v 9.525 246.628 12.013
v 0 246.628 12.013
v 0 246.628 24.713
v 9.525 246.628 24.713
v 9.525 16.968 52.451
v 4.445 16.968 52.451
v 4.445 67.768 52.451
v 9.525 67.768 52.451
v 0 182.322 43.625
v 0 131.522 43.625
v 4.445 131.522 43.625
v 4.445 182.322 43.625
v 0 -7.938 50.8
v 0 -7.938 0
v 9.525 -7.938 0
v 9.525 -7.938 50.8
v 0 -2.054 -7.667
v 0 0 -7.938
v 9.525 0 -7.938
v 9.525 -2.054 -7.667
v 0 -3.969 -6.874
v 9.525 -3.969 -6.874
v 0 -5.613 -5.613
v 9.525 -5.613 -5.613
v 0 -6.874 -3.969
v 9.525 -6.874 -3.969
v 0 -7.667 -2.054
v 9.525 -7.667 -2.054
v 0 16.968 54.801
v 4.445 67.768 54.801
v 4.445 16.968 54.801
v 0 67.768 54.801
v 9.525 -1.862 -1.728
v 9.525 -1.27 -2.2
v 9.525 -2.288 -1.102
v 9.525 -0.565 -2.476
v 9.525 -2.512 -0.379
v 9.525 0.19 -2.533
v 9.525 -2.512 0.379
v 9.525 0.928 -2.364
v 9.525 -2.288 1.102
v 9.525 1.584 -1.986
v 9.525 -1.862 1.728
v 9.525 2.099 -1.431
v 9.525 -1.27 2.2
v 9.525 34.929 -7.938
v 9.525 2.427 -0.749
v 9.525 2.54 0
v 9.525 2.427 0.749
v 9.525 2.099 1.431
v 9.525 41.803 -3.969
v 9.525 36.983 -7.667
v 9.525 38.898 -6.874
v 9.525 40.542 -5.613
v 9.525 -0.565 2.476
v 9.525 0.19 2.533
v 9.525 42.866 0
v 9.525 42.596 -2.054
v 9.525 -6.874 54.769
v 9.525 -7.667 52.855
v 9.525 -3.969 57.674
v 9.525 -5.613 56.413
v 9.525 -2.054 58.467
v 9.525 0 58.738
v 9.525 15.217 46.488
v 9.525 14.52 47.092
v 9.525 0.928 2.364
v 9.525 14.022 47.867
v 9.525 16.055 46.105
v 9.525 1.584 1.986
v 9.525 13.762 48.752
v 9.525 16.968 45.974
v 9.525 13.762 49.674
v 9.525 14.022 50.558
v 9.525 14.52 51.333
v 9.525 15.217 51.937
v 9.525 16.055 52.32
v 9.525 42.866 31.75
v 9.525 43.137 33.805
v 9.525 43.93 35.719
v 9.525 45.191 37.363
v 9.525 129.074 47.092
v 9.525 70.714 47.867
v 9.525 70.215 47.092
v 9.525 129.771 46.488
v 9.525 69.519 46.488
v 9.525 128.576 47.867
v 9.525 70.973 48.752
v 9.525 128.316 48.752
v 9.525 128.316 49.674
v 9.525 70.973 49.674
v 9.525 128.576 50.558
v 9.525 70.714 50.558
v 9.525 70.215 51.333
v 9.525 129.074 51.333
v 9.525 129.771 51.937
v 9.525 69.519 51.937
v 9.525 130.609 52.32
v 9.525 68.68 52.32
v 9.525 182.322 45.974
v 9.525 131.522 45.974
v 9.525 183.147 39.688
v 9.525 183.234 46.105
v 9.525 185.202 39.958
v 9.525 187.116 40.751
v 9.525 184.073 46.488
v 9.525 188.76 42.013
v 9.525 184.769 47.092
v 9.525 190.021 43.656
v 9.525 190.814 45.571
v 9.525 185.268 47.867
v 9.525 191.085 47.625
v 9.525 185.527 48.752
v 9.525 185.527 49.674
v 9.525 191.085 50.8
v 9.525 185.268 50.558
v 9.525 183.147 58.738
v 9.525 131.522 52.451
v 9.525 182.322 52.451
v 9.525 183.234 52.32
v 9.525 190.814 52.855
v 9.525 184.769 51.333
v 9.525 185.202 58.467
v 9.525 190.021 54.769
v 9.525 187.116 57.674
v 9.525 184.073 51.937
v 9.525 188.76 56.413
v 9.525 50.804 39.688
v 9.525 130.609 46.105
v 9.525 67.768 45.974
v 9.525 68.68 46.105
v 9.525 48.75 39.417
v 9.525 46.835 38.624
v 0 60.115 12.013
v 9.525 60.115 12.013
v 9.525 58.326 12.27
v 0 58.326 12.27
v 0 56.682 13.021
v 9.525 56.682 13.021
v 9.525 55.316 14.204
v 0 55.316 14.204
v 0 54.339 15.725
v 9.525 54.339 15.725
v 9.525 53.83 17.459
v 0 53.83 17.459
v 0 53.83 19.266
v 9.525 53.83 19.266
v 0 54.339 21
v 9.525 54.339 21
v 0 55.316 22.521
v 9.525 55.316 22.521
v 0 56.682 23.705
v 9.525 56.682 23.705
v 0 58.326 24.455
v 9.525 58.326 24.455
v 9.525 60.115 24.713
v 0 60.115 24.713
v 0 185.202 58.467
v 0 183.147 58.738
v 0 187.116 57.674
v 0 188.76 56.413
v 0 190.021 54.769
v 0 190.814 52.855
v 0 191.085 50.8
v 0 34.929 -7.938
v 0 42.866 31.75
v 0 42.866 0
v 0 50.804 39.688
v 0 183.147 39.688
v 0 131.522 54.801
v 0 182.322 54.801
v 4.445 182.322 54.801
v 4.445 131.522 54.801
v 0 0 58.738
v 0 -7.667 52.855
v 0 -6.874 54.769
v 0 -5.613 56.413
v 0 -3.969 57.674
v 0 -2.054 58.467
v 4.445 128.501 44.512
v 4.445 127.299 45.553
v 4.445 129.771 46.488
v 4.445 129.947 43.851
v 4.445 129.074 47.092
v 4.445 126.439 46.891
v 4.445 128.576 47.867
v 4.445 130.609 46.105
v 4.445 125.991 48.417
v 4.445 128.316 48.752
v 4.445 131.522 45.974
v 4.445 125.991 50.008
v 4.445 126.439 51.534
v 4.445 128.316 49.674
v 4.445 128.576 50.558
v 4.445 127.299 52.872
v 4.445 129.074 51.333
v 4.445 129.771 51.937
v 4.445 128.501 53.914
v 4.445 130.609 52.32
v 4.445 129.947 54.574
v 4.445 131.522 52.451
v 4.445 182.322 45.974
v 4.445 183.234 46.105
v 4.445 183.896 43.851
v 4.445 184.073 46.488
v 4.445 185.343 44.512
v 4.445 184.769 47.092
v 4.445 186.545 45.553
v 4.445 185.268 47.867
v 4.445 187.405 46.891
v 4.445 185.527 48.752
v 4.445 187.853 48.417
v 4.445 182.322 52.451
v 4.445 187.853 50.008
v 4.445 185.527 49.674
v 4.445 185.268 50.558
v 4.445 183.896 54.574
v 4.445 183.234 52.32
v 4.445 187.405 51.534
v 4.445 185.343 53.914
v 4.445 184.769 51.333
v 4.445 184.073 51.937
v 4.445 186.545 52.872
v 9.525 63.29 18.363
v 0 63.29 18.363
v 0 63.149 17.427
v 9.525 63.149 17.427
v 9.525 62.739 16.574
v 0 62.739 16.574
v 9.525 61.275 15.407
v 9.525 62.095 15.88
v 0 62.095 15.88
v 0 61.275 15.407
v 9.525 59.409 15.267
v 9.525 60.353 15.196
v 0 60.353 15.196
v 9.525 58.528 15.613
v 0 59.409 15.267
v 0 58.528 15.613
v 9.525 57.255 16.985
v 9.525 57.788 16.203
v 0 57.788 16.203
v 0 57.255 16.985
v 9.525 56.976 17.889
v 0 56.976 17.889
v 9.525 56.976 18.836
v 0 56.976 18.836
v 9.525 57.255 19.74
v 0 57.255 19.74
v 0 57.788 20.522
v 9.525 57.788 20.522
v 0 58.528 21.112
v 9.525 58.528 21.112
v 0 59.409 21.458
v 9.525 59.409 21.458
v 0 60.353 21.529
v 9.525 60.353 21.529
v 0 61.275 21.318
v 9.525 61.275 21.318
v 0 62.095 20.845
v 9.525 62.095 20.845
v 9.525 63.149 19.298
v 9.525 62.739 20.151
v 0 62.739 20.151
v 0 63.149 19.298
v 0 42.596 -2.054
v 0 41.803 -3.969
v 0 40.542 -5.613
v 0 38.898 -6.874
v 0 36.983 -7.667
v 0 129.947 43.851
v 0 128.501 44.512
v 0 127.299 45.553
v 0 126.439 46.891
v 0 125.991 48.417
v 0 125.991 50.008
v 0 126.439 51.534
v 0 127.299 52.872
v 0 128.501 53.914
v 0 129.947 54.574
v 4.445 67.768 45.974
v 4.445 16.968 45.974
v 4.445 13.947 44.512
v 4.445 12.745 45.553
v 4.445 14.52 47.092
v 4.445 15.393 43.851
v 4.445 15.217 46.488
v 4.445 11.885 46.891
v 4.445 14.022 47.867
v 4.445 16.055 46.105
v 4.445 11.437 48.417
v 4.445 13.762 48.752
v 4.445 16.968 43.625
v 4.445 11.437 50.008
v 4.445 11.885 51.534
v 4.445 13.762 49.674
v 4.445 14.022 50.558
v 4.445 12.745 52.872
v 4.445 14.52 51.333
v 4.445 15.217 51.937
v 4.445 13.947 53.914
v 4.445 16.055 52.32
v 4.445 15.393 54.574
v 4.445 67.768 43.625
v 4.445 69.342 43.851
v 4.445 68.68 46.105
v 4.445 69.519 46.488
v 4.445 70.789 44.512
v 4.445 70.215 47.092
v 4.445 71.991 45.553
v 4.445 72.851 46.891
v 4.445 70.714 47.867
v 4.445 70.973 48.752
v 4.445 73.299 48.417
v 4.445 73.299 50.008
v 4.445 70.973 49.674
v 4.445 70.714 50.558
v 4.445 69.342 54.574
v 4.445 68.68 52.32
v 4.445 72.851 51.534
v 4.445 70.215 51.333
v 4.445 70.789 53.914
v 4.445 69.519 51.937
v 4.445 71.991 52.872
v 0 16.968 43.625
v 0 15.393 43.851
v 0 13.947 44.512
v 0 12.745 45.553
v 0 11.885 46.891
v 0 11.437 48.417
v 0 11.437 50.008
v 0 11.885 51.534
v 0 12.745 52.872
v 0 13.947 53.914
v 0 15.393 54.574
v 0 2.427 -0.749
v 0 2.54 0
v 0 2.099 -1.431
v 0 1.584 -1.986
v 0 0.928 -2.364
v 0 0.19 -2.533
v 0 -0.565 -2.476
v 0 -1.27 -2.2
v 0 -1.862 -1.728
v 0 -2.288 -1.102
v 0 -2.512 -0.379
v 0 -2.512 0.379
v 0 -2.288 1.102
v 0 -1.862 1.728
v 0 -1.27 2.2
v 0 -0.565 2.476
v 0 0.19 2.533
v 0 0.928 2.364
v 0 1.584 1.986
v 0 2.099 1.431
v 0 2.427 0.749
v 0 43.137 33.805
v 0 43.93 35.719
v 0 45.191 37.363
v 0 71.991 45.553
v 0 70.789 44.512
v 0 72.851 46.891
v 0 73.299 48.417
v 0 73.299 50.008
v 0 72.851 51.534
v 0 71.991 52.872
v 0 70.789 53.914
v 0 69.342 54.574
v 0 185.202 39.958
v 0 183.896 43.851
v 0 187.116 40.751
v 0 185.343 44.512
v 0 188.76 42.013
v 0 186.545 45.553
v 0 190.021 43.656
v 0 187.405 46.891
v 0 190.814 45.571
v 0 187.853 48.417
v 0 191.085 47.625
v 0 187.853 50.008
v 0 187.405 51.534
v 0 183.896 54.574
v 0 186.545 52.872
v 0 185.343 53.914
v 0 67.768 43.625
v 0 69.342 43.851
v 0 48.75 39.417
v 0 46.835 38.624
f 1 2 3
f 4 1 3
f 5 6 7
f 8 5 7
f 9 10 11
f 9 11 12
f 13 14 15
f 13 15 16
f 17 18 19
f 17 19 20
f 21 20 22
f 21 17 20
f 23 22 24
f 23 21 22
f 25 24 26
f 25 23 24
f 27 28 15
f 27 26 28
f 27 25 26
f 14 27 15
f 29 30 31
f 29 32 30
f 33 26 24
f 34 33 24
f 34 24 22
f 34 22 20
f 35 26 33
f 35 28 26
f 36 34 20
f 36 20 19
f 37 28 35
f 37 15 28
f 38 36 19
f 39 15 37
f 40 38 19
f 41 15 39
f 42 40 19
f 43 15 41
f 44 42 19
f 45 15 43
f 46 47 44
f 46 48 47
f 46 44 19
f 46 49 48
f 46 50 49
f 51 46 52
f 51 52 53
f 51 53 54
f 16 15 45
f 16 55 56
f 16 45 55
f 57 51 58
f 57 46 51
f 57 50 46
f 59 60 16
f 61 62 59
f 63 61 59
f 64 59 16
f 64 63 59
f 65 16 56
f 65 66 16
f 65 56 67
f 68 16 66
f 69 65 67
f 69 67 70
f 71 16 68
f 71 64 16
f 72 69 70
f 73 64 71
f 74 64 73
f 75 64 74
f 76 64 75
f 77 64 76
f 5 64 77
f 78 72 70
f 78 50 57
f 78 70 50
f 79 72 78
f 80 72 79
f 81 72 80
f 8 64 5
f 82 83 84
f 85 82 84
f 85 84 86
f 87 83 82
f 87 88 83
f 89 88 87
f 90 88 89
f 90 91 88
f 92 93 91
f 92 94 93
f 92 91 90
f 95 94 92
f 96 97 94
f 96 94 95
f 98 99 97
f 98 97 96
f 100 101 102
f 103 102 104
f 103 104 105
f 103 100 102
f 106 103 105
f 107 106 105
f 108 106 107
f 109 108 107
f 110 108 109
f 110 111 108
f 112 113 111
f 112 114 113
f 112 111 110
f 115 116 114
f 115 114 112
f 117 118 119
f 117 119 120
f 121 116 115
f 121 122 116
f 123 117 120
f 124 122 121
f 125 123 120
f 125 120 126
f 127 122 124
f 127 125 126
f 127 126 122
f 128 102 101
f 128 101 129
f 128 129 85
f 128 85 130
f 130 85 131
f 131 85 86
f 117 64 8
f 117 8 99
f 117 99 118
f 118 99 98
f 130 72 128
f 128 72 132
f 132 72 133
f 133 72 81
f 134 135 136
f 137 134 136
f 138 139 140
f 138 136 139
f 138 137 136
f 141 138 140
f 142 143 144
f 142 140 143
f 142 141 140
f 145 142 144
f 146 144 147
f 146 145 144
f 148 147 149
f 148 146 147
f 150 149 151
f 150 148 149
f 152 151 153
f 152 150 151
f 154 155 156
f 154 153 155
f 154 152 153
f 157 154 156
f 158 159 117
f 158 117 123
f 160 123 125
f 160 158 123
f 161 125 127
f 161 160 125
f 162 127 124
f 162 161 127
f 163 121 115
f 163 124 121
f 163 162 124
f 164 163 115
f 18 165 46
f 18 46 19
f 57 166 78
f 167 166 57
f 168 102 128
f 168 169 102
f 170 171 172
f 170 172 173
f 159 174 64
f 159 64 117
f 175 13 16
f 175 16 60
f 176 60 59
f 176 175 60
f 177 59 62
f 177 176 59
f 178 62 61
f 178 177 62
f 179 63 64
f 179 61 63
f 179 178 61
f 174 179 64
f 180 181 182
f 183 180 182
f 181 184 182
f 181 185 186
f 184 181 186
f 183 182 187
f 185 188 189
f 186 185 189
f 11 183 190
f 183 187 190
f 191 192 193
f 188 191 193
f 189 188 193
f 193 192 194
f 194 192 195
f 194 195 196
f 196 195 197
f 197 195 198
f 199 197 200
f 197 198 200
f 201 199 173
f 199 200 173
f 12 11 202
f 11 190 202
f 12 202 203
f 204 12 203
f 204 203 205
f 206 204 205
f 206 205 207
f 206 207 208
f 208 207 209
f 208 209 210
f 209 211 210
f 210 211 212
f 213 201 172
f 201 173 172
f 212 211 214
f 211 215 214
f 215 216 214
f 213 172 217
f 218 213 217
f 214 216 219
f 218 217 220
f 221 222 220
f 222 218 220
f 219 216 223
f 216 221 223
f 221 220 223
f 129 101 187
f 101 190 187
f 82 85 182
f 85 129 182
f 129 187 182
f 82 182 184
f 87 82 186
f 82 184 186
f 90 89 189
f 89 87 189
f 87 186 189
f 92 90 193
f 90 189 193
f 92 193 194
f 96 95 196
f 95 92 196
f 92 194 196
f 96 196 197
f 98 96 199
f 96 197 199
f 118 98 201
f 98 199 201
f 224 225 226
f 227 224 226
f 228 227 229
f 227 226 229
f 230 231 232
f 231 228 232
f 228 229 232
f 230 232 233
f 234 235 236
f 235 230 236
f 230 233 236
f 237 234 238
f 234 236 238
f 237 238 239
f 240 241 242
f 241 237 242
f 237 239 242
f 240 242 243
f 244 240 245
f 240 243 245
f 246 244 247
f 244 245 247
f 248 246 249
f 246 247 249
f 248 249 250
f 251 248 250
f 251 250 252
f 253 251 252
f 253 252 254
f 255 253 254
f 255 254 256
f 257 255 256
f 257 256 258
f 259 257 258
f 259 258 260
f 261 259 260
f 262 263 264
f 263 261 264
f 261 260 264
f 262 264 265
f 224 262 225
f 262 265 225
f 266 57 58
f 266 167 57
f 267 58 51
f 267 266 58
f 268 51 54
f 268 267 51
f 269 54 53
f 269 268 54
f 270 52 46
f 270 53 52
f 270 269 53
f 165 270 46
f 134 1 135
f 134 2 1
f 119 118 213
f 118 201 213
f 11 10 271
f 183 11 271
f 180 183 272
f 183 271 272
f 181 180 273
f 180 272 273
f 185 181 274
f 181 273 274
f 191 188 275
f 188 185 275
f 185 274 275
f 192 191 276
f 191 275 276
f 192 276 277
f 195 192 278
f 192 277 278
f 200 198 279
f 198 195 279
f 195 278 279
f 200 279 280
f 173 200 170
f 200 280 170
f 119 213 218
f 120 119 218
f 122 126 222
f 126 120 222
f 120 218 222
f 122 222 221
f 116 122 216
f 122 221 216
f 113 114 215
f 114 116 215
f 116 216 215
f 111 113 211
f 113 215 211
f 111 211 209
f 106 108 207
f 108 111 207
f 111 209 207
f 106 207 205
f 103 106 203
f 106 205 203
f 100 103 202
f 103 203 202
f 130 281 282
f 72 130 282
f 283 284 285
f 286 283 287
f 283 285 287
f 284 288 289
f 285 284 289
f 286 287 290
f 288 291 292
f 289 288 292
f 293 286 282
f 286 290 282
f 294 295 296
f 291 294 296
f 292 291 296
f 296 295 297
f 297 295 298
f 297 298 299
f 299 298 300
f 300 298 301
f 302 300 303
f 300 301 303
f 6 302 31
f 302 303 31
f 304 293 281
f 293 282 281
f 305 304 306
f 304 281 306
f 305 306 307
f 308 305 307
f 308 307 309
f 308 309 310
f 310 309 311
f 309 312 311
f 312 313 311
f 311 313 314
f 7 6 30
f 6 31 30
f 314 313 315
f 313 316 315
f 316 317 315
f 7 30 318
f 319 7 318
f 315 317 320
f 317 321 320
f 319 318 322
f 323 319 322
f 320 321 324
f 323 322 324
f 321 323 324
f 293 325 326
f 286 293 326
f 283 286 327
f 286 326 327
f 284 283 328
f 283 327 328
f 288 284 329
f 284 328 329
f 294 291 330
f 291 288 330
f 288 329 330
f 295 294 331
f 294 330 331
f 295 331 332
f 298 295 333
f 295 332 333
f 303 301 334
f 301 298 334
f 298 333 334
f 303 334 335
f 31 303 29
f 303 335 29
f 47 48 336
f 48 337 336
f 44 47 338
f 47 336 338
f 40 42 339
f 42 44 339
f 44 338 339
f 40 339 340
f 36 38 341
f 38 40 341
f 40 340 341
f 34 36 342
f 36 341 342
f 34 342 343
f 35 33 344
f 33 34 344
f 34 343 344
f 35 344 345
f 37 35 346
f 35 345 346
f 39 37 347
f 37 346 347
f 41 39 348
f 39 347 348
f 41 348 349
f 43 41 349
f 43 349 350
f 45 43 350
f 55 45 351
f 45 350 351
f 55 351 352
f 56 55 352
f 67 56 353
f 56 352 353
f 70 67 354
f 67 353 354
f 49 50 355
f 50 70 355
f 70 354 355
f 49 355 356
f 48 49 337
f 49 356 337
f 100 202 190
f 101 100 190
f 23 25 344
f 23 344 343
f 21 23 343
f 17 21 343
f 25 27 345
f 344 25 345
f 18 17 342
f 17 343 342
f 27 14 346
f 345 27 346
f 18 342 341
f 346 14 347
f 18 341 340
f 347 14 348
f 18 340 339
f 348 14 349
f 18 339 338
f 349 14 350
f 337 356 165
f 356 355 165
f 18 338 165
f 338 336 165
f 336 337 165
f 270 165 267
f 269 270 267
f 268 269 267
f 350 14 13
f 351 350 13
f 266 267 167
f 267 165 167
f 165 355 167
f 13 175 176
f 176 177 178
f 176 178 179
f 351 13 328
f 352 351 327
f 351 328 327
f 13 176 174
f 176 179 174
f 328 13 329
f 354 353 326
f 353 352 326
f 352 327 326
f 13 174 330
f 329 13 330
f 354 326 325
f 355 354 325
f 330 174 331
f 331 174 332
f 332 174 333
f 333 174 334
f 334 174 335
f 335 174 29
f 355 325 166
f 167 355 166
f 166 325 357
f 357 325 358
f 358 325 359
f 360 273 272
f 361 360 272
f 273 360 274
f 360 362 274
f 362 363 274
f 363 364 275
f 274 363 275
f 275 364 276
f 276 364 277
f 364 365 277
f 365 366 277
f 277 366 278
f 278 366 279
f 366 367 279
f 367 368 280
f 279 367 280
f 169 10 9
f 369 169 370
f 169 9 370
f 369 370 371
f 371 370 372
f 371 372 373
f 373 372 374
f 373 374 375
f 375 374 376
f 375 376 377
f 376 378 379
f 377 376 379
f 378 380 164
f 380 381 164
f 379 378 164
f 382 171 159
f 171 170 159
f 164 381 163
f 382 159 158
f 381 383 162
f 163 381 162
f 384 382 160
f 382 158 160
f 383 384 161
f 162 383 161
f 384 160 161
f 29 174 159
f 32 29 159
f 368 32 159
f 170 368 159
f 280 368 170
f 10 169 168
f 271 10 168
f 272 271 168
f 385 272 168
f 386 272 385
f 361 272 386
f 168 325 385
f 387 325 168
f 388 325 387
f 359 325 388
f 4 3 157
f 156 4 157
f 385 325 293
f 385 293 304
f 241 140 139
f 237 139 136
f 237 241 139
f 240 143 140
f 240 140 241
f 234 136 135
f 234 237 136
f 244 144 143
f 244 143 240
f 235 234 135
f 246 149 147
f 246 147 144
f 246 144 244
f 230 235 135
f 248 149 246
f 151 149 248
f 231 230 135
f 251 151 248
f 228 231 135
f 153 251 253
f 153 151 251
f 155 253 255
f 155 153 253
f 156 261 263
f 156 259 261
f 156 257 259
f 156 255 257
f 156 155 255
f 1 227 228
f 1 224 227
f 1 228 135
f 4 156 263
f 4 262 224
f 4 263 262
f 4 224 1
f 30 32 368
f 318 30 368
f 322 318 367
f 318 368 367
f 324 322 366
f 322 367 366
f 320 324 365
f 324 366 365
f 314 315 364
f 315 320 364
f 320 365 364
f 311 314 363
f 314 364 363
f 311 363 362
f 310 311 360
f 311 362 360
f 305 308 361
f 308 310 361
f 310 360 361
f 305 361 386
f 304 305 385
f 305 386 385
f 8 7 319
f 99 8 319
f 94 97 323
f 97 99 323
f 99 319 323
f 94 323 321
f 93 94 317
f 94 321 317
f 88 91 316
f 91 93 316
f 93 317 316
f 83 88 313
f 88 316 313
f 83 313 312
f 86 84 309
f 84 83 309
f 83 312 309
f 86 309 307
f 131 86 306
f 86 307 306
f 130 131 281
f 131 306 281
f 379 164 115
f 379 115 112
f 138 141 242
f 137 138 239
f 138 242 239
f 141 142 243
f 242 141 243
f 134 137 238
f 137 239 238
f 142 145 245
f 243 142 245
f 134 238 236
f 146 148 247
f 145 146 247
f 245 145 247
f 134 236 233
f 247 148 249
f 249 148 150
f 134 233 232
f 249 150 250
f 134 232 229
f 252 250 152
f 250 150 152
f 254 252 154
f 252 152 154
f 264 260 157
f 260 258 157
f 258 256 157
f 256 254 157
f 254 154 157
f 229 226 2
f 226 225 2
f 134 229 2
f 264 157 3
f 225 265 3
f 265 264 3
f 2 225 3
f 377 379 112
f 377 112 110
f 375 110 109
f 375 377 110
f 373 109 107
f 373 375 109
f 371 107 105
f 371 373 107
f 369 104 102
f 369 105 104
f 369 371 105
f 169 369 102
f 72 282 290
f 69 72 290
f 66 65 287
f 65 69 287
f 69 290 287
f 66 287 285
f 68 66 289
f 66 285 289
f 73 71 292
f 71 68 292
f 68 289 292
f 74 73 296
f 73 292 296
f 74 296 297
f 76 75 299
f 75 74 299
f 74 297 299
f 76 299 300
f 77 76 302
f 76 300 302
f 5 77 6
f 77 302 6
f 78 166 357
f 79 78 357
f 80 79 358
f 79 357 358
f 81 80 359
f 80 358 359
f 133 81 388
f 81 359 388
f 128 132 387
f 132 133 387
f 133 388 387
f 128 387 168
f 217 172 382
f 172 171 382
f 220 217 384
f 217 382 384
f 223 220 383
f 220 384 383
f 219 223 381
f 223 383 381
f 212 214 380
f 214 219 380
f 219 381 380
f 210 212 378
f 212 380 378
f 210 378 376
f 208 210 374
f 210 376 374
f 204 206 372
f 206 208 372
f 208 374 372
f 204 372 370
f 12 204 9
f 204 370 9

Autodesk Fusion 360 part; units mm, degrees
sketch "Sketch1" plane through (0, 0, 0) normal (1, 0, 0) x (0, 1, 0) in component "Arm"
  line L0 (239.539, 35.8777) -> (53.0265, 35.8777)
  line L1 (239.539, 23.1777) -> (239.539, 35.8777)
  line L2 (239.539, 23.1777) -> (53.0265, 23.1777)
  circle A0 centre (53.0265, 29.5277) radius 3.175
  arc A1 (53.0265, 35.8777) -> (53.0265, 23.1777) centre (53.0265, 29.5277) ccw
  point P0 (46.6765, 29.5277)
  dimension "d23" = 12.7
  dimension "d24" = 6.35
  dimension "d25" = 6.35
  dimension "d26" = 192.8625
extrude "Extrude2" add sketch "Sketch1" along normal blind 9.525 makes body 1 in component "Arm"
sketch "Sketch1 (2)" plane through (0, 0, 0) normal (1, 0, 0) x (0, 1, 0) in component "BasePlate"
  line L0 (34.929, -7.9375) -> (0, -7.9375)
  line L1 (42.8665, 31.7502) -> (42.8665, 0)
  arc A0 (50.804, 39.6877) -> (42.8665, 31.7502) centre (50.804, 31.7502) ccw
  line L2 (183.1472, 39.6877) -> (50.804, 39.6877)
  arc A1 (183.1472, 39.6877) -> (191.0847, 47.6252) centre (183.1472, 47.6252) ccw
  line L3 (191.0847, 50.8002) -> (191.0847, 47.6252)
  arc A2 (191.0847, 50.8002) -> (183.1472, 58.7377) centre (183.1472, 50.8002) ccw
  line L4 (0, 58.7377) -> (183.1472, 58.7377)
  line L5 (-7.9375, 0) -> (-7.9375, 50.8002)
  circle A3 centre (0, 0) radius 2.54
  line L6 (16.9677, 43.6247) -> (67.7677, 43.6247)
  arc A4 (16.9677, 54.8007) -> (16.9677, 43.6247) centre (16.9677, 49.2127) ccw
  arc A5 (16.9677, 52.4512) -> (16.9677, 45.9742) centre (16.9677, 49.2127) ccw
  line L7 (16.9677, 52.4512) -> (67.7677, 52.4512)
  line L8 (67.7677, 45.9742) -> (16.9677, 45.9742)
  arc A6 (67.7677, 45.9742) -> (67.7677, 52.4512) centre (67.7677, 49.2127) ccw
  line L9 (67.7677, 54.8007) -> (16.9677, 54.8007)
  arc A7 (67.7677, 43.6247) -> (67.7677, 54.8007) centre (67.7677, 49.2127) ccw
  arc A8 (131.5217, 54.8007) -> (131.5217, 43.6247) centre (131.5217, 49.2127) ccw
  line L10 (131.5217, 43.6247) -> (182.3217, 43.6247)
  arc A9 (182.3217, 43.6247) -> (182.3217, 54.8007) centre (182.3217, 49.2127) ccw
  arc A10 (182.3217, 45.9742) -> (182.3217, 52.4512) centre (182.3217, 49.2127) ccw
  line L11 (131.5217, 52.4512) -> (182.3217, 52.4512)
  line L12 (182.3217, 54.8007) -> (131.5217, 54.8007)
  arc A11 (131.5217, 52.4512) -> (131.5217, 45.9742) centre (131.5217, 49.2127) ccw
  line L13 (182.3217, 45.9742) -> (131.5217, 45.9742)
  arc A12 (0, 58.7377) -> (-7.9375, 50.8002) centre (0, 50.8002) ccw
  arc A13 (-7.9375, 0) -> (0, -7.9375) centre (0, 0) ccw
  arc A14 (34.929, -7.9375) -> (42.8665, 0) centre (34.929, 0) ccw
  line L14 (239.539, 23.1777) -> (239.539, 35.8777)
  dimension "d17" = 66.6752
  dimension "d18" = 50.804
  dimension "d19" = 7.9375
  dimension "d20" = 19.05
  dimension "d21" = 199.0222
  dimension "d27" = 50.8
  dimension "d28" = 50.8
  dimension "d29" = 6.477
  dimension "d30" = 11.176
  dimension "d31" = 5.08
extrude "Extrude3" add sketch "Sketch1 (2)" along normal blind 9.525 separate body contours L0 L1 A0 L2 A1 L3 A2 L4 L5 A12 A13 A14 | L6 A4 L9 A7 | A8 L10 A9 L12 makes body 2 in component "Arm"
extrude "Extrude4" cut sketch "Sketch1 (2)" along normal blind 4.445 contours L6 A4 L9 A7 | A8 L10 A9 L12 bodies 2 in component "Arm"
thread "Thread1" "ANSI Unified Screw Threads 0.25 1/4-20 UNC 3B" major diameter 6.35 minor diameter 5.1156 pitch 1.27 angle 60 resizes the face on face at (6.35, 2.5368, -0.1266) on bodies 2 in component "Arm"
copy_body "CutPasteBodies1" bodies 2 removing the originals makes body 3 in component "BasePlate"
thread "Thread1'" "ANSI Unified Screw Threads 0.25 1/4-20 UNC 3B" major diameter 6.35 minor diameter 5.1156 pitch 1.27 angle 60 resizes the face on face at (3.175, 2.5546, 0.1275) on bodies 3 in component "BasePlate"
component "Arm" placed x (1, 0, 0) y (0, 1, 0) z (0, 0, 1) at (0, 7.0889, -11.1651)
component "BasePlate" placed x (1, 0, 0) y (0, 1, 0) z (0, 0, 1) at (0, 0, 0)
equation "d159_1 = 0.00000 in"
equation "d160_1 = 0.0000 deg"
